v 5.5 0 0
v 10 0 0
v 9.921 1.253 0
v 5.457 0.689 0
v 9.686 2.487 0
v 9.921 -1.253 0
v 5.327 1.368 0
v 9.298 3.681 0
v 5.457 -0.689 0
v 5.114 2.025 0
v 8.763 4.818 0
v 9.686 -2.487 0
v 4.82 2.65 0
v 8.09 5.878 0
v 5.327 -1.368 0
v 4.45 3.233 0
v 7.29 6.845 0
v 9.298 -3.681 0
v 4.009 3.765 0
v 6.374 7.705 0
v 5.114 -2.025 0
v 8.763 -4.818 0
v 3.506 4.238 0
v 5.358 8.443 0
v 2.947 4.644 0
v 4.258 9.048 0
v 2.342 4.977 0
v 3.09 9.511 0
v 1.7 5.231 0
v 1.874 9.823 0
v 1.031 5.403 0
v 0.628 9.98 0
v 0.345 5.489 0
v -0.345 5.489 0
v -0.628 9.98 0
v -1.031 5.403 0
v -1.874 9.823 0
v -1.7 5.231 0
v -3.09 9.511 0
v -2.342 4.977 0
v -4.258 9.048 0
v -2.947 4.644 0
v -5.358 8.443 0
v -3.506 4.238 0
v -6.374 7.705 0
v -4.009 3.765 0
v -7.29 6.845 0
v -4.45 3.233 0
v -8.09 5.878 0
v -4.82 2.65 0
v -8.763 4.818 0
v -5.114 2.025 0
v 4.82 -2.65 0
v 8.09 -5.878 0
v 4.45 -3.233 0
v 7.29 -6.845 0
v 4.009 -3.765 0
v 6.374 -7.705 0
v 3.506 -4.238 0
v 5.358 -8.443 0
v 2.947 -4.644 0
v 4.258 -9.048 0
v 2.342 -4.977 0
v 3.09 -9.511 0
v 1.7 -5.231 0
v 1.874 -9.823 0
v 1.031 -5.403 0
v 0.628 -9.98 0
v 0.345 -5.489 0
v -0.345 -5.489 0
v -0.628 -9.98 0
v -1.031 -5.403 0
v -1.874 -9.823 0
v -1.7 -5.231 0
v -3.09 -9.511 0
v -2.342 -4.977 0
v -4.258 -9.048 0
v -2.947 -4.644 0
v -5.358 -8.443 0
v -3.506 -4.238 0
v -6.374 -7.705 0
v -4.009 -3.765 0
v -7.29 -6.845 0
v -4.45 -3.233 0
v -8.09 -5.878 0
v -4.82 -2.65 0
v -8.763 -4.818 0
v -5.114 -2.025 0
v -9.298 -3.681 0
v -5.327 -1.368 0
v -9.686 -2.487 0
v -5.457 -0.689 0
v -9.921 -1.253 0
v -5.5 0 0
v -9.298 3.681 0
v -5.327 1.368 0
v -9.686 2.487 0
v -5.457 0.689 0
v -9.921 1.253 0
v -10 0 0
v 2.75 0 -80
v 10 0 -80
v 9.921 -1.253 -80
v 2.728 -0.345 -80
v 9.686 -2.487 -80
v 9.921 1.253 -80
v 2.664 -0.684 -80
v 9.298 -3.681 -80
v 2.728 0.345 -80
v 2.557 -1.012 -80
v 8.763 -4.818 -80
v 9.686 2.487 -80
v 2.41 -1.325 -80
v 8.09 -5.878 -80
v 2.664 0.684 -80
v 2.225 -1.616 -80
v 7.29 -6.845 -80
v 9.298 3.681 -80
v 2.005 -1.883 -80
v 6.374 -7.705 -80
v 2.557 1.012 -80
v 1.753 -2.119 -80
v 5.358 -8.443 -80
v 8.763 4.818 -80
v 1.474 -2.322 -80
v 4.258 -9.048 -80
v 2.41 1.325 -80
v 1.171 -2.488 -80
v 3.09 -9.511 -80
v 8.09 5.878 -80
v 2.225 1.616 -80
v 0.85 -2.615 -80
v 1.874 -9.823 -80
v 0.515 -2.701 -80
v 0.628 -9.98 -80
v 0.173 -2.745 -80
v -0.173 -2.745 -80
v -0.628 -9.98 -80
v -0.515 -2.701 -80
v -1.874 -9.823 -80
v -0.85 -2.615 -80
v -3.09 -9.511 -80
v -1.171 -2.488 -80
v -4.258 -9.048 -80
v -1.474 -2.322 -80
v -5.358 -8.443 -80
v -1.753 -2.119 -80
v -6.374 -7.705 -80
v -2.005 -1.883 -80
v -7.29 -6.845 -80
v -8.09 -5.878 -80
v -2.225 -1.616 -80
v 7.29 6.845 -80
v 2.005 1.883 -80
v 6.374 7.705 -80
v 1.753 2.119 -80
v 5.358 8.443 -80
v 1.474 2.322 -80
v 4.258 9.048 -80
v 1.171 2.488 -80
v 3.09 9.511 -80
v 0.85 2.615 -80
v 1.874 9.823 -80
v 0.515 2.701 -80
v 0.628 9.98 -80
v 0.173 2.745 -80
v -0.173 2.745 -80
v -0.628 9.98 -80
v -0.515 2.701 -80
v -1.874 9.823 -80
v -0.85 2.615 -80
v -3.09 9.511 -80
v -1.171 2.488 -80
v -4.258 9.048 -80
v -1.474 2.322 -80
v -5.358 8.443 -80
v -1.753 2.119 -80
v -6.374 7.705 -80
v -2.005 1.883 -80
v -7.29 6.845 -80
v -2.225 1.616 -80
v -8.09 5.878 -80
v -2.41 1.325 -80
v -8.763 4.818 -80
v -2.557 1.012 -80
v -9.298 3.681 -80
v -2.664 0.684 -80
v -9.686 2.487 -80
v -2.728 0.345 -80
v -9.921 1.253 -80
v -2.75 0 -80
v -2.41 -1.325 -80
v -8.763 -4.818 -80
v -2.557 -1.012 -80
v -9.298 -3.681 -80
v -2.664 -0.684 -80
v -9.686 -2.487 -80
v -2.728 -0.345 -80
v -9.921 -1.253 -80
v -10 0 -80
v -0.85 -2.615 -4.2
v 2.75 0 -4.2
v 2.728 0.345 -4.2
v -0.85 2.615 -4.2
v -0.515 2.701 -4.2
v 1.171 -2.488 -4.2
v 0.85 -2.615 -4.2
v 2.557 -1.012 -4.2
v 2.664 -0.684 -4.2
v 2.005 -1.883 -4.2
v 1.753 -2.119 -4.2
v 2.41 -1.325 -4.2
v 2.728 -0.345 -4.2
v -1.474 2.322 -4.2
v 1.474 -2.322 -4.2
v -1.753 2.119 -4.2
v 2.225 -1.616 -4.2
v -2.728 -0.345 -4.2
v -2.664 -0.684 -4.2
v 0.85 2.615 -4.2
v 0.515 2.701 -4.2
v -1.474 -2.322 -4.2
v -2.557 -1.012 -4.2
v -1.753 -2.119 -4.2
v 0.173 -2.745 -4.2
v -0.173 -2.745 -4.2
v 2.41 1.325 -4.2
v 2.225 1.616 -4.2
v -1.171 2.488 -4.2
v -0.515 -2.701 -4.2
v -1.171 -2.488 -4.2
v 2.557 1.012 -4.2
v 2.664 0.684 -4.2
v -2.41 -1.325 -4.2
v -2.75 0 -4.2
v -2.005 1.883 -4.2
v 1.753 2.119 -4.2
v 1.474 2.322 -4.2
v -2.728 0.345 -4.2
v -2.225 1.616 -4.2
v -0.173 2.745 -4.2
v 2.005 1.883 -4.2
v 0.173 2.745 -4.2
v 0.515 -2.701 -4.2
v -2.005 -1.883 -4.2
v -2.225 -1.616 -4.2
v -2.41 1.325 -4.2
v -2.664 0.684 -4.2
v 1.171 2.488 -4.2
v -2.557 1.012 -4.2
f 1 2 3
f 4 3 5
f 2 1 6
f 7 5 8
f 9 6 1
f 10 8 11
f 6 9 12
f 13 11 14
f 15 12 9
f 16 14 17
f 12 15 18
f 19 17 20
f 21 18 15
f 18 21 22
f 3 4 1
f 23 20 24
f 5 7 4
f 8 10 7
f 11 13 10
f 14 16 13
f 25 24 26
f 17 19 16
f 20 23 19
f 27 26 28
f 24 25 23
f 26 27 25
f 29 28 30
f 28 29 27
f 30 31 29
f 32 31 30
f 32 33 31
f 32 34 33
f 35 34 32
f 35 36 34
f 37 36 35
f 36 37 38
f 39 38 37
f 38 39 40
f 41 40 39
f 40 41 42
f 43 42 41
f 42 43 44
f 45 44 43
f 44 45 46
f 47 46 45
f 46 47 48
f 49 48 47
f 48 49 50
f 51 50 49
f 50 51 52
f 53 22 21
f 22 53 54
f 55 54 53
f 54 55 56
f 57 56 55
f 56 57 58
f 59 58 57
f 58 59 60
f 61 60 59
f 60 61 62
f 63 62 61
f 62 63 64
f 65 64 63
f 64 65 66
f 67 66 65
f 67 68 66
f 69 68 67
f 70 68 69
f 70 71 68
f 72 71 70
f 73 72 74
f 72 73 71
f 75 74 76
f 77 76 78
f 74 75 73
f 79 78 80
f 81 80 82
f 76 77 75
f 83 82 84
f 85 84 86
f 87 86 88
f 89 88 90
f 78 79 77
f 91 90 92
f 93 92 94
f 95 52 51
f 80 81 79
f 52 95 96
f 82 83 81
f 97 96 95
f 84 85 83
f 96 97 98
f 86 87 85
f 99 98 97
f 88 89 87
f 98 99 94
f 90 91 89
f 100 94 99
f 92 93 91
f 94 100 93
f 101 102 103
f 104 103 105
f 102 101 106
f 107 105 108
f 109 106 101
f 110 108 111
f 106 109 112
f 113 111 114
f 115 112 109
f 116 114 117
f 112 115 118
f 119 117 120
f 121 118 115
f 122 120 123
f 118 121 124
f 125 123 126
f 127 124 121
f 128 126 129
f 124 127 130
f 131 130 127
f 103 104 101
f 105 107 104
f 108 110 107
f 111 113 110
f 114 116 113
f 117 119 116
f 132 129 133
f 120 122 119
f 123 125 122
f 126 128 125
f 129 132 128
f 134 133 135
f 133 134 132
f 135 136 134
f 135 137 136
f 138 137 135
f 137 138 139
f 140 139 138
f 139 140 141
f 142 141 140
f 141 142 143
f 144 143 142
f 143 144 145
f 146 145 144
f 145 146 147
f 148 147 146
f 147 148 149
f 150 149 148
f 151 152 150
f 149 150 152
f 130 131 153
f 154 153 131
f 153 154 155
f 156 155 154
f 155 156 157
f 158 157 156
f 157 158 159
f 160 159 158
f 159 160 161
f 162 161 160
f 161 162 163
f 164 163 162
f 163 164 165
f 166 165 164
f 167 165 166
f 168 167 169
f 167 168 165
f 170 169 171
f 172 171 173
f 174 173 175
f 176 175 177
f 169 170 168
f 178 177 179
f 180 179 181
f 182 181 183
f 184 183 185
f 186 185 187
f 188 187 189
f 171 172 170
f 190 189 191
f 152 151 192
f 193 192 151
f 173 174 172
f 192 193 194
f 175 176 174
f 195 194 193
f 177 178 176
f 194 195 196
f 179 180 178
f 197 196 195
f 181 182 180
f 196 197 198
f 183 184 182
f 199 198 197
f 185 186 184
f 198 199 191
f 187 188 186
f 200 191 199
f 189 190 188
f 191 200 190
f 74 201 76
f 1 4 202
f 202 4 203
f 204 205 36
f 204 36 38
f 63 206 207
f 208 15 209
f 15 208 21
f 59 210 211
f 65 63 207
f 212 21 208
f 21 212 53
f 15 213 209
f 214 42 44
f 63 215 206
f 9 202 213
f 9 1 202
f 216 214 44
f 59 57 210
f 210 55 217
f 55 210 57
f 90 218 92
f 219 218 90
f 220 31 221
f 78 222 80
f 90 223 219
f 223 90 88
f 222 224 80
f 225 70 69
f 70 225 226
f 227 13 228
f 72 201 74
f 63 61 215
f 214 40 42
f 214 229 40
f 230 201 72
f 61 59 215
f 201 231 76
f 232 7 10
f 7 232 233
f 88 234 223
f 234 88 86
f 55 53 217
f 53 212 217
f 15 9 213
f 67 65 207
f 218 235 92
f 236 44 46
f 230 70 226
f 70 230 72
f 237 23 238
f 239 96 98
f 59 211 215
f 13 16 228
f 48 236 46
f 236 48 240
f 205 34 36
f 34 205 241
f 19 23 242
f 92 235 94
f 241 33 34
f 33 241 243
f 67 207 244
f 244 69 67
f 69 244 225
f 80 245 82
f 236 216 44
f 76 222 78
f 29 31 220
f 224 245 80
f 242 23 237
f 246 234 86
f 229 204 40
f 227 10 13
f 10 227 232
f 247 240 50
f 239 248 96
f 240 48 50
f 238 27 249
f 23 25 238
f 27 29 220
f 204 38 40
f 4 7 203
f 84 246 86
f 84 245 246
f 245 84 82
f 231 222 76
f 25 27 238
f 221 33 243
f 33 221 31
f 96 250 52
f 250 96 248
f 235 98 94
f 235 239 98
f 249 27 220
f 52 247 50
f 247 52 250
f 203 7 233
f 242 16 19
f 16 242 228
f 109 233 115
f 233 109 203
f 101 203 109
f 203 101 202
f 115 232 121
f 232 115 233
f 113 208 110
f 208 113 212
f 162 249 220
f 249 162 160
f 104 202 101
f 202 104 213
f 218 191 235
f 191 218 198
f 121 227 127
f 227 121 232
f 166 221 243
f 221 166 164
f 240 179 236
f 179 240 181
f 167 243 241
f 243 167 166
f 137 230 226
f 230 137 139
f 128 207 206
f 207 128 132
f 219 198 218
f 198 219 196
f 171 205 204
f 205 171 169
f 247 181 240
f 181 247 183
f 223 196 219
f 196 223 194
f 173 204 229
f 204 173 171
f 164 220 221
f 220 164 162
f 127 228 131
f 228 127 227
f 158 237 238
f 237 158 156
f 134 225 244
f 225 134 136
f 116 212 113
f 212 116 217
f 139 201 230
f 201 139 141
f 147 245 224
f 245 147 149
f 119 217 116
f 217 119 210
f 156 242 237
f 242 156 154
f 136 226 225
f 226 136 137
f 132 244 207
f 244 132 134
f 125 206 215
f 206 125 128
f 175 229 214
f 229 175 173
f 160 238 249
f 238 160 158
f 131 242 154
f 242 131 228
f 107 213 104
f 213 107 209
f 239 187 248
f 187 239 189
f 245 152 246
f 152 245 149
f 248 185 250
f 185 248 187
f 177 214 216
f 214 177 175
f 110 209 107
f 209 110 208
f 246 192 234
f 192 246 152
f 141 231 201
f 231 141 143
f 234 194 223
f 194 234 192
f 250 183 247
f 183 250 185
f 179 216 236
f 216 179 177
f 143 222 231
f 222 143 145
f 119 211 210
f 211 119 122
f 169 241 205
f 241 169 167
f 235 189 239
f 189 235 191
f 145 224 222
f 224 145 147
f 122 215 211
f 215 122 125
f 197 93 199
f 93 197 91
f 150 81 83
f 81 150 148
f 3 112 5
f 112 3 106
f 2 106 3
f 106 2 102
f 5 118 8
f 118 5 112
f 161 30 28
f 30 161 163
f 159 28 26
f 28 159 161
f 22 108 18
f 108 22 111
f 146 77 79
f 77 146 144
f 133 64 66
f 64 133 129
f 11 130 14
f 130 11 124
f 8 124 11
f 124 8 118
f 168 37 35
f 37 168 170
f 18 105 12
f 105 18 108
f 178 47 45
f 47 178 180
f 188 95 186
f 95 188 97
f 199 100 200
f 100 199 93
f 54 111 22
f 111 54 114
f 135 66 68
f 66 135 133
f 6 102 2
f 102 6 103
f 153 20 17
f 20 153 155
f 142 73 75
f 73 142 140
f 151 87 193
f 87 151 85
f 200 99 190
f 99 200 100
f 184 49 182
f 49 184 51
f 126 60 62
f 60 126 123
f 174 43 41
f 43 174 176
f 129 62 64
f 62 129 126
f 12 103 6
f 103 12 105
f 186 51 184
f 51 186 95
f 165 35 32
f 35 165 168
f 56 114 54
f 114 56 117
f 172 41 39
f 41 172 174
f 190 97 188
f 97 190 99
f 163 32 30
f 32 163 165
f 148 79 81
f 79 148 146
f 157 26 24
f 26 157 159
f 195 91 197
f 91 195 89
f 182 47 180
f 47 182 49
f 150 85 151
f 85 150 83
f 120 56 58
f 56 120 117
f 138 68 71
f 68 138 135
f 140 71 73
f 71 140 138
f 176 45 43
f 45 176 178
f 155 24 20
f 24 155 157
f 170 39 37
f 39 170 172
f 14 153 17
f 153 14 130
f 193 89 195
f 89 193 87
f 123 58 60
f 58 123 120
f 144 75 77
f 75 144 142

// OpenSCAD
$fn = 50;


difference() {
	union() {
		translate(v = [0, 0, -80.0000000000]) {
			cylinder(h = 80, r = 10.0000000000);
		}
		cylinder(h = 0, r = 20.0000000000);
	}
	union() {
		translate(v = [0, 0, 0]) {
			rotate(a = [0, 0, 0]) {
				difference() {
					union() {
						#translate(v = [0, 0, -80.0000000000]) {
							cylinder(h = 80, r = 2.2500000000);
						}
						#translate(v = [0, 0, -4.2000000000]) {
							cylinder(h = 4.2000000000, r = 10.0000000000, r1 = 2.7500000000, r2 = 5.5000000000);
						}
						#translate(v = [0, 0, -80.0000000000]) {
							cylinder(h = 80, r = 2.7500000000);
						}
						#translate(v = [0, 0, -80.0000000000]) {
							cylinder(h = 80, r = 2.2500000000);
						}
					}
					union();
				}
			}
		}
	}
}
